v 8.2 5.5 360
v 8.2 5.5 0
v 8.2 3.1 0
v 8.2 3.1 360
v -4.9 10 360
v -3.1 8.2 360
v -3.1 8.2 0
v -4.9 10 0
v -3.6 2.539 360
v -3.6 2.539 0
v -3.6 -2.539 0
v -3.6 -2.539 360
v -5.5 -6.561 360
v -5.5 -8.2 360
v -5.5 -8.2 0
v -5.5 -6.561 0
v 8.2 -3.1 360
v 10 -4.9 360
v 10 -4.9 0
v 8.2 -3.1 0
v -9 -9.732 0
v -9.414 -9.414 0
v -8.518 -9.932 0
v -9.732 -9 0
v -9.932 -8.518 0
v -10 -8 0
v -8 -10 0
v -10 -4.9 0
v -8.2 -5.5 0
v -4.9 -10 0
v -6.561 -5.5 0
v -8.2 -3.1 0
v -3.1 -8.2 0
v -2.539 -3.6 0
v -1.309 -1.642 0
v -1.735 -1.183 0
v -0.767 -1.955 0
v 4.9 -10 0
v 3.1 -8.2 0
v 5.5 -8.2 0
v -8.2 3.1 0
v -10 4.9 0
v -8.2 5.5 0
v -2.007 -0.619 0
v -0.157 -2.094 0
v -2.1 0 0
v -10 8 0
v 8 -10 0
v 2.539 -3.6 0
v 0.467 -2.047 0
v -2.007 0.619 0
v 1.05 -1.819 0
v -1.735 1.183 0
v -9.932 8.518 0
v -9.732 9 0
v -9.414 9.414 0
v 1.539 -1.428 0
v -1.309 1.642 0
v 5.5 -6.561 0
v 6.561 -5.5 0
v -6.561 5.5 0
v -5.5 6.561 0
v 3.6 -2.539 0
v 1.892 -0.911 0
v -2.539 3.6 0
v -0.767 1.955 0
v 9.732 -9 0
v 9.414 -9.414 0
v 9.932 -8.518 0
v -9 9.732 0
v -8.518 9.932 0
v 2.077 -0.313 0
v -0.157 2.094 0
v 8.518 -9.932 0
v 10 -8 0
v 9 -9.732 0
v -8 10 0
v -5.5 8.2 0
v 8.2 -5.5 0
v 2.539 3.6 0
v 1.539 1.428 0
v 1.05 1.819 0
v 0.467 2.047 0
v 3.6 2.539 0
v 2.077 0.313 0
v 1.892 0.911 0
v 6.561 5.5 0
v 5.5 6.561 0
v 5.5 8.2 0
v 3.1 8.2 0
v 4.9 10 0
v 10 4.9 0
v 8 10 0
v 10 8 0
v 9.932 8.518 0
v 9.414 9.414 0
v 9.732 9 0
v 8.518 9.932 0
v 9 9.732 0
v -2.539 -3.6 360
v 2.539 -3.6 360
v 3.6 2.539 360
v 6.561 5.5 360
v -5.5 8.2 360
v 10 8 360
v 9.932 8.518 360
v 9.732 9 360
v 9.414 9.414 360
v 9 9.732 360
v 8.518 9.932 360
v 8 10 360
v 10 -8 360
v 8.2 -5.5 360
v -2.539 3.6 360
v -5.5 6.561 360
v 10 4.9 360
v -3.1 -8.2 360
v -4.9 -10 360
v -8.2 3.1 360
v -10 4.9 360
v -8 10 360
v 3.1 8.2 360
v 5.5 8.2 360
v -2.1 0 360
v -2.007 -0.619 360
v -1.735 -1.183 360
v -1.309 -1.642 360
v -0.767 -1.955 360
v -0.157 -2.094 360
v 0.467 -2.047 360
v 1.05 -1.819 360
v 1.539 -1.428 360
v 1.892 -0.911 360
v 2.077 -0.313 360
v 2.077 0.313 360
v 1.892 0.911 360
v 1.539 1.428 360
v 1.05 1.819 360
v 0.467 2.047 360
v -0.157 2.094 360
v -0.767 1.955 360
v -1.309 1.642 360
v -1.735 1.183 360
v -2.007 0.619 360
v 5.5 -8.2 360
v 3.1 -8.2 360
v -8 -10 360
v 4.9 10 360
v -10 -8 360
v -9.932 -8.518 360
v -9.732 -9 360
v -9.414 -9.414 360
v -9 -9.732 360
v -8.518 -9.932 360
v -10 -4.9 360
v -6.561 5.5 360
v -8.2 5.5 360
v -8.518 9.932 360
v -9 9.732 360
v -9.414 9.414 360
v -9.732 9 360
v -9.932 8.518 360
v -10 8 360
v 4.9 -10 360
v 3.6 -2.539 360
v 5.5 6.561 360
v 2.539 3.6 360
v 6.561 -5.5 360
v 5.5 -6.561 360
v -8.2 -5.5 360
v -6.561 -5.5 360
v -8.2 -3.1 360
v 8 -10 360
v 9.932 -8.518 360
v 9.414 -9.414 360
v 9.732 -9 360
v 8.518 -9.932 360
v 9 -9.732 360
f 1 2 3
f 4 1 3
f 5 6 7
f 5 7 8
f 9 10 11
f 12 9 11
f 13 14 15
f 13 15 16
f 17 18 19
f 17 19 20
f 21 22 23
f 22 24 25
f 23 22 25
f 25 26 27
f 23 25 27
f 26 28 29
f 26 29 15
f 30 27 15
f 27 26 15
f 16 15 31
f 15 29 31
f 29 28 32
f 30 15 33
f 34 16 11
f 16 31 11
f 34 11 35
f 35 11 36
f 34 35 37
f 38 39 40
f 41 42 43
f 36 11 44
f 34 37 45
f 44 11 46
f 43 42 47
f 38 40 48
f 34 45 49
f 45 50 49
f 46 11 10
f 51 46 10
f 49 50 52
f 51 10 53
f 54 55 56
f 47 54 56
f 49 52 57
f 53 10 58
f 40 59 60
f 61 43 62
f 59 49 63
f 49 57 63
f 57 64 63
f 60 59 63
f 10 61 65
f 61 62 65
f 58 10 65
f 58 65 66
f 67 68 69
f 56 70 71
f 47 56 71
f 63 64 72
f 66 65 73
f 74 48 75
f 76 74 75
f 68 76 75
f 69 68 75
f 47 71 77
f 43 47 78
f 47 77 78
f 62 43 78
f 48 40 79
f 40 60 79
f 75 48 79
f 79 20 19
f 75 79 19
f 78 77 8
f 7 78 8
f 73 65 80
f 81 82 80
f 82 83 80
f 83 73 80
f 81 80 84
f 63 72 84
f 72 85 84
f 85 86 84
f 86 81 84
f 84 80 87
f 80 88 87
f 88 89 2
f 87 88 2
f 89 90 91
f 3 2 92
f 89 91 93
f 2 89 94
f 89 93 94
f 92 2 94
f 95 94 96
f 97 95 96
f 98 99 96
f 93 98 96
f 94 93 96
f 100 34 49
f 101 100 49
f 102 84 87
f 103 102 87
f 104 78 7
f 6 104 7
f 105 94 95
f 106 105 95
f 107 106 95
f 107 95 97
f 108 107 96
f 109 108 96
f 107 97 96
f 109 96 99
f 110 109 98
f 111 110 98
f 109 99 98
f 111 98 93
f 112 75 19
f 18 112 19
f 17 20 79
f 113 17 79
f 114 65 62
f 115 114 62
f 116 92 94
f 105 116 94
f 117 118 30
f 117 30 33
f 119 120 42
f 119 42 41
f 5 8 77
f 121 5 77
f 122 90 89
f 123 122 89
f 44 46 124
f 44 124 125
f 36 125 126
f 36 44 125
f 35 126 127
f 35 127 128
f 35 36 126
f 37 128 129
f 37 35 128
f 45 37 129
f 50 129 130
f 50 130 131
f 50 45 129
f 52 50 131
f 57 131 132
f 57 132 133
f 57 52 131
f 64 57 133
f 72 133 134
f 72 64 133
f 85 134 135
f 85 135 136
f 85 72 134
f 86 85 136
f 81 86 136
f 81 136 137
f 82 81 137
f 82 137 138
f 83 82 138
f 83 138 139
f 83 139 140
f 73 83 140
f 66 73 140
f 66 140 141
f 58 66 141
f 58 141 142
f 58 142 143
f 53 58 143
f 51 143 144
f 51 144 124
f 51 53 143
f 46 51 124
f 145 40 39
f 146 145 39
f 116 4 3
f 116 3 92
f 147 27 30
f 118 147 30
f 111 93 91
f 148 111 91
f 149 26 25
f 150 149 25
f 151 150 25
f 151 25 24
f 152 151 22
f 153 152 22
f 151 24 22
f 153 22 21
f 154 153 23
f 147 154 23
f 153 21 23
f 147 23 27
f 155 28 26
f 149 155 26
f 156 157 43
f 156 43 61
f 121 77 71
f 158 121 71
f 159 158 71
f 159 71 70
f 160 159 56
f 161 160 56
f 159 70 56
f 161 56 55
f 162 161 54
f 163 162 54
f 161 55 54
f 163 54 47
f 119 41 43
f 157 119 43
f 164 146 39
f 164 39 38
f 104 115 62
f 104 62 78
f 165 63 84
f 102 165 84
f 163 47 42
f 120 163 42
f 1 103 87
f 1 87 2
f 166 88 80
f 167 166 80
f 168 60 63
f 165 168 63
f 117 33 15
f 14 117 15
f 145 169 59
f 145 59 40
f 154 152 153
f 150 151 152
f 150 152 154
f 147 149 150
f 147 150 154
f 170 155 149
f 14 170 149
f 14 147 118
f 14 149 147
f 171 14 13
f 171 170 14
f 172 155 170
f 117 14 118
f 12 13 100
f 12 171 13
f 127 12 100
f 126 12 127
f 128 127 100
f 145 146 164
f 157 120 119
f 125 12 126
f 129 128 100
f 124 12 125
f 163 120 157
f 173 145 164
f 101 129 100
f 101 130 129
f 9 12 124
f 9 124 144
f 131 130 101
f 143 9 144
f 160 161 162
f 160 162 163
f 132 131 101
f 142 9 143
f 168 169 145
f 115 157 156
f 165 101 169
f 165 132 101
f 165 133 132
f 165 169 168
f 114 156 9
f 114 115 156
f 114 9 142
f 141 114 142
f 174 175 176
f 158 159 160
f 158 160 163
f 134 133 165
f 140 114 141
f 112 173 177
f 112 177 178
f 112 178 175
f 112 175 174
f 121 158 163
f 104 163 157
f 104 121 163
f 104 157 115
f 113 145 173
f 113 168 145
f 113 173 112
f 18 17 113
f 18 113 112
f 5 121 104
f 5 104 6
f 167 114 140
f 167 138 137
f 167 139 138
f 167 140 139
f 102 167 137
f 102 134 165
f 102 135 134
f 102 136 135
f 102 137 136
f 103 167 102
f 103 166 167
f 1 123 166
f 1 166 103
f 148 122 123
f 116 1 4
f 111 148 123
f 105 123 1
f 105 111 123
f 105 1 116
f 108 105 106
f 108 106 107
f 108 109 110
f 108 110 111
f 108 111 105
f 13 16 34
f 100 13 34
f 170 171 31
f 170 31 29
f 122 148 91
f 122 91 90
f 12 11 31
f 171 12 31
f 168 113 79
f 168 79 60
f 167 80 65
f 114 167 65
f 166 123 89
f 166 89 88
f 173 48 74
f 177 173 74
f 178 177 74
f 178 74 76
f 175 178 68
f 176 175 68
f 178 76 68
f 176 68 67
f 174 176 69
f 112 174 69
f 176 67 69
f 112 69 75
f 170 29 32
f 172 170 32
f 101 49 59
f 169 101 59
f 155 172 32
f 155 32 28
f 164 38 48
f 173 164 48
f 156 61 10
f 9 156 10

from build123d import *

# Parameters (mm, degrees)
SKETCH1_R           = 2.1
BOSS_EXTRUDE1_DEPTH = 360


with BuildPart() as part:
    # Sketch1 → Boss-Extrude1 (new body)
    with BuildSketch(Plane.XY):
        with BuildLine():
            Line((-4.9, -10), (-3.1, -8.2))
            Line((-3.1, -8.2), (-5.5, -8.2))
            Line((-5.5, -8.2), (-5.5, -6.560660172))
            Line((-5.5, -6.560660172), (-2.539339828, -3.6))
            Line((-2.539339828, -3.6), (2.539339828, -3.6))
            Line((2.539339828, -3.6), (5.5, -6.560660172))
            Line((5.5, -6.560660172), (5.5, -8.2))
            Line((5.5, -8.2), (3.1, -8.2))
            Line((3.1, -8.2), (4.9, -10))
            Line((4.9, -10), (8, -10))
            ThreePointArc((8, -10), (9.414213562, -9.414213562), (10, -8))
            Line((10, -8), (10, -4.9))
            Line((10, -4.9), (8.2, -3.1))
            Line((8.2, -3.1), (8.2, -5.5))
            Line((8.2, -5.5), (6.560660172, -5.5))
            Line((6.560660172, -5.5), (3.6, -2.539339828))
            Line((3.6, -2.539339828), (3.6, 2.539339828))
            Line((3.6, 2.539339828), (6.560660172, 5.5))
            Line((6.560660172, 5.5), (8.2, 5.5))
            Line((8.2, 5.5), (8.2, 3.1))
            Line((8.2, 3.1), (10, 4.9))
            Line((10, 4.9), (10, 8))
            ThreePointArc((10, 8), (9.414213562, 9.414213562), (8, 10))
            Line((8, 10), (4.9, 10))
            Line((4.9, 10), (3.1, 8.2))
            Line((3.1, 8.2), (5.5, 8.2))
            Line((5.5, 8.2), (5.5, 6.560660172))
            Line((5.5, 6.560660172), (2.539339828, 3.6))
            Line((2.539339828, 3.6), (-2.539339828, 3.6))
            Line((-2.539339828, 3.6), (-5.5, 6.560660172))
            Line((-5.5, 6.560660172), (-5.5, 8.2))
            Line((-5.5, 8.2), (-3.1, 8.2))
            Line((-3.1, 8.2), (-4.9, 10))
            Line((-4.9, 10), (-8, 10))
            ThreePointArc((-8, 10), (-9.414213562, 9.414213562), (-10, 8))
            Line((-10, 8), (-10, 4.9))
            Line((-10, 4.9), (-8.2, 3.1))
            Line((-8.2, 3.1), (-8.2, 5.5))
            Line((-8.2, 5.5), (-6.560660172, 5.5))
            Line((-6.560660172, 5.5), (-3.6, 2.539339828))
            Line((-3.6, 2.539339828), (-3.6, -2.539339828))
            Line((-3.6, -2.539339828), (-6.560660172, -5.5))
            Line((-6.560660172, -5.5), (-8.2, -5.5))
            Line((-8.2, -5.5), (-8.2, -3.1))
            Line((-8.2, -3.1), (-10, -4.9))
            Line((-10, -4.9), (-10, -8))
            ThreePointArc((-10, -8), (-9.414213562, -9.414213562), (-8, -10))
            Line((-8, -10), (-4.9, -10))
        make_face()
        with Locations(Location((0, 0, 0), (0, 0, 180))):
            Circle(SKETCH1_R, mode=Mode.SUBTRACT)
    extrude(amount=BOSS_EXTRUDE1_DEPTH)


solid = part.part
